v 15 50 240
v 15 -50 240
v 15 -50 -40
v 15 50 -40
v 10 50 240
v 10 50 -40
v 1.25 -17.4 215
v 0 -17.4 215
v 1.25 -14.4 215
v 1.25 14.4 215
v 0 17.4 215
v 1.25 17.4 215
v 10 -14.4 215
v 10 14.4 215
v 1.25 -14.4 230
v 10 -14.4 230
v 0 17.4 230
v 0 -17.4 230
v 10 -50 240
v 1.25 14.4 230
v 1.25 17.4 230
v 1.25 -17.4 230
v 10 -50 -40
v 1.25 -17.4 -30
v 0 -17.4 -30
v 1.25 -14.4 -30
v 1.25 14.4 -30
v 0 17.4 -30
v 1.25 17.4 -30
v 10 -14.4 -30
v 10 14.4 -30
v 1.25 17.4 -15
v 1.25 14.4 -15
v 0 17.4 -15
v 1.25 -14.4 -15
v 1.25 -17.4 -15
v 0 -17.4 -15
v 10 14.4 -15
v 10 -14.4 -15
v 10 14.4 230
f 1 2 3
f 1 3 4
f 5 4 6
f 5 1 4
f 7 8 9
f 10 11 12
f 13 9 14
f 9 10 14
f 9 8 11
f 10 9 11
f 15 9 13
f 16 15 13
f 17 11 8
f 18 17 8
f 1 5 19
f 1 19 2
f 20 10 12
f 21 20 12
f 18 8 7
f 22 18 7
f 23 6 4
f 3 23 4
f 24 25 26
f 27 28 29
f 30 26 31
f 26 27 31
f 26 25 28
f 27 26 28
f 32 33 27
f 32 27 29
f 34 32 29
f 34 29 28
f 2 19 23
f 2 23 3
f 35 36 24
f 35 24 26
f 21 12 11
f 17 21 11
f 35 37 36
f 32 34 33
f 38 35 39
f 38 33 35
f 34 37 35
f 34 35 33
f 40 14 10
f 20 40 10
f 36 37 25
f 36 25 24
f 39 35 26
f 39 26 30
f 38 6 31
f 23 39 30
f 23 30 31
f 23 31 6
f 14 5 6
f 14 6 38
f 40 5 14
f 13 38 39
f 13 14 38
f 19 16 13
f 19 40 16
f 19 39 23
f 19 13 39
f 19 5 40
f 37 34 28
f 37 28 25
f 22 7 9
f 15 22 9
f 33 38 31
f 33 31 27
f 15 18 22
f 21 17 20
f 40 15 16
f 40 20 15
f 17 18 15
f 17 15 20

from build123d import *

# Parameters (mm, degrees)
F1_START      = -15
F1_DEPTH      = 15
F2_DEPTH      = 240
F2_DEPTH_BACK = 40
F3_START      = 215
F3_DEPTH      = 15


with BuildPart() as f1:
    # F0 (on Top) → F1 (new body)
    with BuildSketch(Plane.XY.offset(F1_START)):
        Polygon((0, 17.4), (0, 0), (0, -17.4), (1.25, -17.4), (1.25, -14.4), (10, -14.4), (10, 14.4), (1.25, 14.4), (1.25, 17.4), align=None)
    extrude(amount=-F1_DEPTH)

    # F0 (on Top) → F2 (join, two sides)
    with BuildSketch(Plane.XY) as f2_sk:
        Polygon((10, 50), (10, 14.4), (10, -14.4), (10, -50), (15, -50), (15, 0), (15, 50), align=None)
    extrude(amount=F2_DEPTH)
    extrude(f2_sk.sketch, amount=-F2_DEPTH_BACK)

    # F0 (on Top) → F3 (join)
    with BuildSketch(Plane.XY.offset(F3_START)):
        Polygon((0, 17.4), (0, 0), (0, -17.4), (1.25, -17.4), (1.25, -14.4), (10, -14.4), (10, 14.4), (1.25, 14.4), (1.25, 17.4), align=None)
    extrude(amount=F3_DEPTH)


solid = f1.part
